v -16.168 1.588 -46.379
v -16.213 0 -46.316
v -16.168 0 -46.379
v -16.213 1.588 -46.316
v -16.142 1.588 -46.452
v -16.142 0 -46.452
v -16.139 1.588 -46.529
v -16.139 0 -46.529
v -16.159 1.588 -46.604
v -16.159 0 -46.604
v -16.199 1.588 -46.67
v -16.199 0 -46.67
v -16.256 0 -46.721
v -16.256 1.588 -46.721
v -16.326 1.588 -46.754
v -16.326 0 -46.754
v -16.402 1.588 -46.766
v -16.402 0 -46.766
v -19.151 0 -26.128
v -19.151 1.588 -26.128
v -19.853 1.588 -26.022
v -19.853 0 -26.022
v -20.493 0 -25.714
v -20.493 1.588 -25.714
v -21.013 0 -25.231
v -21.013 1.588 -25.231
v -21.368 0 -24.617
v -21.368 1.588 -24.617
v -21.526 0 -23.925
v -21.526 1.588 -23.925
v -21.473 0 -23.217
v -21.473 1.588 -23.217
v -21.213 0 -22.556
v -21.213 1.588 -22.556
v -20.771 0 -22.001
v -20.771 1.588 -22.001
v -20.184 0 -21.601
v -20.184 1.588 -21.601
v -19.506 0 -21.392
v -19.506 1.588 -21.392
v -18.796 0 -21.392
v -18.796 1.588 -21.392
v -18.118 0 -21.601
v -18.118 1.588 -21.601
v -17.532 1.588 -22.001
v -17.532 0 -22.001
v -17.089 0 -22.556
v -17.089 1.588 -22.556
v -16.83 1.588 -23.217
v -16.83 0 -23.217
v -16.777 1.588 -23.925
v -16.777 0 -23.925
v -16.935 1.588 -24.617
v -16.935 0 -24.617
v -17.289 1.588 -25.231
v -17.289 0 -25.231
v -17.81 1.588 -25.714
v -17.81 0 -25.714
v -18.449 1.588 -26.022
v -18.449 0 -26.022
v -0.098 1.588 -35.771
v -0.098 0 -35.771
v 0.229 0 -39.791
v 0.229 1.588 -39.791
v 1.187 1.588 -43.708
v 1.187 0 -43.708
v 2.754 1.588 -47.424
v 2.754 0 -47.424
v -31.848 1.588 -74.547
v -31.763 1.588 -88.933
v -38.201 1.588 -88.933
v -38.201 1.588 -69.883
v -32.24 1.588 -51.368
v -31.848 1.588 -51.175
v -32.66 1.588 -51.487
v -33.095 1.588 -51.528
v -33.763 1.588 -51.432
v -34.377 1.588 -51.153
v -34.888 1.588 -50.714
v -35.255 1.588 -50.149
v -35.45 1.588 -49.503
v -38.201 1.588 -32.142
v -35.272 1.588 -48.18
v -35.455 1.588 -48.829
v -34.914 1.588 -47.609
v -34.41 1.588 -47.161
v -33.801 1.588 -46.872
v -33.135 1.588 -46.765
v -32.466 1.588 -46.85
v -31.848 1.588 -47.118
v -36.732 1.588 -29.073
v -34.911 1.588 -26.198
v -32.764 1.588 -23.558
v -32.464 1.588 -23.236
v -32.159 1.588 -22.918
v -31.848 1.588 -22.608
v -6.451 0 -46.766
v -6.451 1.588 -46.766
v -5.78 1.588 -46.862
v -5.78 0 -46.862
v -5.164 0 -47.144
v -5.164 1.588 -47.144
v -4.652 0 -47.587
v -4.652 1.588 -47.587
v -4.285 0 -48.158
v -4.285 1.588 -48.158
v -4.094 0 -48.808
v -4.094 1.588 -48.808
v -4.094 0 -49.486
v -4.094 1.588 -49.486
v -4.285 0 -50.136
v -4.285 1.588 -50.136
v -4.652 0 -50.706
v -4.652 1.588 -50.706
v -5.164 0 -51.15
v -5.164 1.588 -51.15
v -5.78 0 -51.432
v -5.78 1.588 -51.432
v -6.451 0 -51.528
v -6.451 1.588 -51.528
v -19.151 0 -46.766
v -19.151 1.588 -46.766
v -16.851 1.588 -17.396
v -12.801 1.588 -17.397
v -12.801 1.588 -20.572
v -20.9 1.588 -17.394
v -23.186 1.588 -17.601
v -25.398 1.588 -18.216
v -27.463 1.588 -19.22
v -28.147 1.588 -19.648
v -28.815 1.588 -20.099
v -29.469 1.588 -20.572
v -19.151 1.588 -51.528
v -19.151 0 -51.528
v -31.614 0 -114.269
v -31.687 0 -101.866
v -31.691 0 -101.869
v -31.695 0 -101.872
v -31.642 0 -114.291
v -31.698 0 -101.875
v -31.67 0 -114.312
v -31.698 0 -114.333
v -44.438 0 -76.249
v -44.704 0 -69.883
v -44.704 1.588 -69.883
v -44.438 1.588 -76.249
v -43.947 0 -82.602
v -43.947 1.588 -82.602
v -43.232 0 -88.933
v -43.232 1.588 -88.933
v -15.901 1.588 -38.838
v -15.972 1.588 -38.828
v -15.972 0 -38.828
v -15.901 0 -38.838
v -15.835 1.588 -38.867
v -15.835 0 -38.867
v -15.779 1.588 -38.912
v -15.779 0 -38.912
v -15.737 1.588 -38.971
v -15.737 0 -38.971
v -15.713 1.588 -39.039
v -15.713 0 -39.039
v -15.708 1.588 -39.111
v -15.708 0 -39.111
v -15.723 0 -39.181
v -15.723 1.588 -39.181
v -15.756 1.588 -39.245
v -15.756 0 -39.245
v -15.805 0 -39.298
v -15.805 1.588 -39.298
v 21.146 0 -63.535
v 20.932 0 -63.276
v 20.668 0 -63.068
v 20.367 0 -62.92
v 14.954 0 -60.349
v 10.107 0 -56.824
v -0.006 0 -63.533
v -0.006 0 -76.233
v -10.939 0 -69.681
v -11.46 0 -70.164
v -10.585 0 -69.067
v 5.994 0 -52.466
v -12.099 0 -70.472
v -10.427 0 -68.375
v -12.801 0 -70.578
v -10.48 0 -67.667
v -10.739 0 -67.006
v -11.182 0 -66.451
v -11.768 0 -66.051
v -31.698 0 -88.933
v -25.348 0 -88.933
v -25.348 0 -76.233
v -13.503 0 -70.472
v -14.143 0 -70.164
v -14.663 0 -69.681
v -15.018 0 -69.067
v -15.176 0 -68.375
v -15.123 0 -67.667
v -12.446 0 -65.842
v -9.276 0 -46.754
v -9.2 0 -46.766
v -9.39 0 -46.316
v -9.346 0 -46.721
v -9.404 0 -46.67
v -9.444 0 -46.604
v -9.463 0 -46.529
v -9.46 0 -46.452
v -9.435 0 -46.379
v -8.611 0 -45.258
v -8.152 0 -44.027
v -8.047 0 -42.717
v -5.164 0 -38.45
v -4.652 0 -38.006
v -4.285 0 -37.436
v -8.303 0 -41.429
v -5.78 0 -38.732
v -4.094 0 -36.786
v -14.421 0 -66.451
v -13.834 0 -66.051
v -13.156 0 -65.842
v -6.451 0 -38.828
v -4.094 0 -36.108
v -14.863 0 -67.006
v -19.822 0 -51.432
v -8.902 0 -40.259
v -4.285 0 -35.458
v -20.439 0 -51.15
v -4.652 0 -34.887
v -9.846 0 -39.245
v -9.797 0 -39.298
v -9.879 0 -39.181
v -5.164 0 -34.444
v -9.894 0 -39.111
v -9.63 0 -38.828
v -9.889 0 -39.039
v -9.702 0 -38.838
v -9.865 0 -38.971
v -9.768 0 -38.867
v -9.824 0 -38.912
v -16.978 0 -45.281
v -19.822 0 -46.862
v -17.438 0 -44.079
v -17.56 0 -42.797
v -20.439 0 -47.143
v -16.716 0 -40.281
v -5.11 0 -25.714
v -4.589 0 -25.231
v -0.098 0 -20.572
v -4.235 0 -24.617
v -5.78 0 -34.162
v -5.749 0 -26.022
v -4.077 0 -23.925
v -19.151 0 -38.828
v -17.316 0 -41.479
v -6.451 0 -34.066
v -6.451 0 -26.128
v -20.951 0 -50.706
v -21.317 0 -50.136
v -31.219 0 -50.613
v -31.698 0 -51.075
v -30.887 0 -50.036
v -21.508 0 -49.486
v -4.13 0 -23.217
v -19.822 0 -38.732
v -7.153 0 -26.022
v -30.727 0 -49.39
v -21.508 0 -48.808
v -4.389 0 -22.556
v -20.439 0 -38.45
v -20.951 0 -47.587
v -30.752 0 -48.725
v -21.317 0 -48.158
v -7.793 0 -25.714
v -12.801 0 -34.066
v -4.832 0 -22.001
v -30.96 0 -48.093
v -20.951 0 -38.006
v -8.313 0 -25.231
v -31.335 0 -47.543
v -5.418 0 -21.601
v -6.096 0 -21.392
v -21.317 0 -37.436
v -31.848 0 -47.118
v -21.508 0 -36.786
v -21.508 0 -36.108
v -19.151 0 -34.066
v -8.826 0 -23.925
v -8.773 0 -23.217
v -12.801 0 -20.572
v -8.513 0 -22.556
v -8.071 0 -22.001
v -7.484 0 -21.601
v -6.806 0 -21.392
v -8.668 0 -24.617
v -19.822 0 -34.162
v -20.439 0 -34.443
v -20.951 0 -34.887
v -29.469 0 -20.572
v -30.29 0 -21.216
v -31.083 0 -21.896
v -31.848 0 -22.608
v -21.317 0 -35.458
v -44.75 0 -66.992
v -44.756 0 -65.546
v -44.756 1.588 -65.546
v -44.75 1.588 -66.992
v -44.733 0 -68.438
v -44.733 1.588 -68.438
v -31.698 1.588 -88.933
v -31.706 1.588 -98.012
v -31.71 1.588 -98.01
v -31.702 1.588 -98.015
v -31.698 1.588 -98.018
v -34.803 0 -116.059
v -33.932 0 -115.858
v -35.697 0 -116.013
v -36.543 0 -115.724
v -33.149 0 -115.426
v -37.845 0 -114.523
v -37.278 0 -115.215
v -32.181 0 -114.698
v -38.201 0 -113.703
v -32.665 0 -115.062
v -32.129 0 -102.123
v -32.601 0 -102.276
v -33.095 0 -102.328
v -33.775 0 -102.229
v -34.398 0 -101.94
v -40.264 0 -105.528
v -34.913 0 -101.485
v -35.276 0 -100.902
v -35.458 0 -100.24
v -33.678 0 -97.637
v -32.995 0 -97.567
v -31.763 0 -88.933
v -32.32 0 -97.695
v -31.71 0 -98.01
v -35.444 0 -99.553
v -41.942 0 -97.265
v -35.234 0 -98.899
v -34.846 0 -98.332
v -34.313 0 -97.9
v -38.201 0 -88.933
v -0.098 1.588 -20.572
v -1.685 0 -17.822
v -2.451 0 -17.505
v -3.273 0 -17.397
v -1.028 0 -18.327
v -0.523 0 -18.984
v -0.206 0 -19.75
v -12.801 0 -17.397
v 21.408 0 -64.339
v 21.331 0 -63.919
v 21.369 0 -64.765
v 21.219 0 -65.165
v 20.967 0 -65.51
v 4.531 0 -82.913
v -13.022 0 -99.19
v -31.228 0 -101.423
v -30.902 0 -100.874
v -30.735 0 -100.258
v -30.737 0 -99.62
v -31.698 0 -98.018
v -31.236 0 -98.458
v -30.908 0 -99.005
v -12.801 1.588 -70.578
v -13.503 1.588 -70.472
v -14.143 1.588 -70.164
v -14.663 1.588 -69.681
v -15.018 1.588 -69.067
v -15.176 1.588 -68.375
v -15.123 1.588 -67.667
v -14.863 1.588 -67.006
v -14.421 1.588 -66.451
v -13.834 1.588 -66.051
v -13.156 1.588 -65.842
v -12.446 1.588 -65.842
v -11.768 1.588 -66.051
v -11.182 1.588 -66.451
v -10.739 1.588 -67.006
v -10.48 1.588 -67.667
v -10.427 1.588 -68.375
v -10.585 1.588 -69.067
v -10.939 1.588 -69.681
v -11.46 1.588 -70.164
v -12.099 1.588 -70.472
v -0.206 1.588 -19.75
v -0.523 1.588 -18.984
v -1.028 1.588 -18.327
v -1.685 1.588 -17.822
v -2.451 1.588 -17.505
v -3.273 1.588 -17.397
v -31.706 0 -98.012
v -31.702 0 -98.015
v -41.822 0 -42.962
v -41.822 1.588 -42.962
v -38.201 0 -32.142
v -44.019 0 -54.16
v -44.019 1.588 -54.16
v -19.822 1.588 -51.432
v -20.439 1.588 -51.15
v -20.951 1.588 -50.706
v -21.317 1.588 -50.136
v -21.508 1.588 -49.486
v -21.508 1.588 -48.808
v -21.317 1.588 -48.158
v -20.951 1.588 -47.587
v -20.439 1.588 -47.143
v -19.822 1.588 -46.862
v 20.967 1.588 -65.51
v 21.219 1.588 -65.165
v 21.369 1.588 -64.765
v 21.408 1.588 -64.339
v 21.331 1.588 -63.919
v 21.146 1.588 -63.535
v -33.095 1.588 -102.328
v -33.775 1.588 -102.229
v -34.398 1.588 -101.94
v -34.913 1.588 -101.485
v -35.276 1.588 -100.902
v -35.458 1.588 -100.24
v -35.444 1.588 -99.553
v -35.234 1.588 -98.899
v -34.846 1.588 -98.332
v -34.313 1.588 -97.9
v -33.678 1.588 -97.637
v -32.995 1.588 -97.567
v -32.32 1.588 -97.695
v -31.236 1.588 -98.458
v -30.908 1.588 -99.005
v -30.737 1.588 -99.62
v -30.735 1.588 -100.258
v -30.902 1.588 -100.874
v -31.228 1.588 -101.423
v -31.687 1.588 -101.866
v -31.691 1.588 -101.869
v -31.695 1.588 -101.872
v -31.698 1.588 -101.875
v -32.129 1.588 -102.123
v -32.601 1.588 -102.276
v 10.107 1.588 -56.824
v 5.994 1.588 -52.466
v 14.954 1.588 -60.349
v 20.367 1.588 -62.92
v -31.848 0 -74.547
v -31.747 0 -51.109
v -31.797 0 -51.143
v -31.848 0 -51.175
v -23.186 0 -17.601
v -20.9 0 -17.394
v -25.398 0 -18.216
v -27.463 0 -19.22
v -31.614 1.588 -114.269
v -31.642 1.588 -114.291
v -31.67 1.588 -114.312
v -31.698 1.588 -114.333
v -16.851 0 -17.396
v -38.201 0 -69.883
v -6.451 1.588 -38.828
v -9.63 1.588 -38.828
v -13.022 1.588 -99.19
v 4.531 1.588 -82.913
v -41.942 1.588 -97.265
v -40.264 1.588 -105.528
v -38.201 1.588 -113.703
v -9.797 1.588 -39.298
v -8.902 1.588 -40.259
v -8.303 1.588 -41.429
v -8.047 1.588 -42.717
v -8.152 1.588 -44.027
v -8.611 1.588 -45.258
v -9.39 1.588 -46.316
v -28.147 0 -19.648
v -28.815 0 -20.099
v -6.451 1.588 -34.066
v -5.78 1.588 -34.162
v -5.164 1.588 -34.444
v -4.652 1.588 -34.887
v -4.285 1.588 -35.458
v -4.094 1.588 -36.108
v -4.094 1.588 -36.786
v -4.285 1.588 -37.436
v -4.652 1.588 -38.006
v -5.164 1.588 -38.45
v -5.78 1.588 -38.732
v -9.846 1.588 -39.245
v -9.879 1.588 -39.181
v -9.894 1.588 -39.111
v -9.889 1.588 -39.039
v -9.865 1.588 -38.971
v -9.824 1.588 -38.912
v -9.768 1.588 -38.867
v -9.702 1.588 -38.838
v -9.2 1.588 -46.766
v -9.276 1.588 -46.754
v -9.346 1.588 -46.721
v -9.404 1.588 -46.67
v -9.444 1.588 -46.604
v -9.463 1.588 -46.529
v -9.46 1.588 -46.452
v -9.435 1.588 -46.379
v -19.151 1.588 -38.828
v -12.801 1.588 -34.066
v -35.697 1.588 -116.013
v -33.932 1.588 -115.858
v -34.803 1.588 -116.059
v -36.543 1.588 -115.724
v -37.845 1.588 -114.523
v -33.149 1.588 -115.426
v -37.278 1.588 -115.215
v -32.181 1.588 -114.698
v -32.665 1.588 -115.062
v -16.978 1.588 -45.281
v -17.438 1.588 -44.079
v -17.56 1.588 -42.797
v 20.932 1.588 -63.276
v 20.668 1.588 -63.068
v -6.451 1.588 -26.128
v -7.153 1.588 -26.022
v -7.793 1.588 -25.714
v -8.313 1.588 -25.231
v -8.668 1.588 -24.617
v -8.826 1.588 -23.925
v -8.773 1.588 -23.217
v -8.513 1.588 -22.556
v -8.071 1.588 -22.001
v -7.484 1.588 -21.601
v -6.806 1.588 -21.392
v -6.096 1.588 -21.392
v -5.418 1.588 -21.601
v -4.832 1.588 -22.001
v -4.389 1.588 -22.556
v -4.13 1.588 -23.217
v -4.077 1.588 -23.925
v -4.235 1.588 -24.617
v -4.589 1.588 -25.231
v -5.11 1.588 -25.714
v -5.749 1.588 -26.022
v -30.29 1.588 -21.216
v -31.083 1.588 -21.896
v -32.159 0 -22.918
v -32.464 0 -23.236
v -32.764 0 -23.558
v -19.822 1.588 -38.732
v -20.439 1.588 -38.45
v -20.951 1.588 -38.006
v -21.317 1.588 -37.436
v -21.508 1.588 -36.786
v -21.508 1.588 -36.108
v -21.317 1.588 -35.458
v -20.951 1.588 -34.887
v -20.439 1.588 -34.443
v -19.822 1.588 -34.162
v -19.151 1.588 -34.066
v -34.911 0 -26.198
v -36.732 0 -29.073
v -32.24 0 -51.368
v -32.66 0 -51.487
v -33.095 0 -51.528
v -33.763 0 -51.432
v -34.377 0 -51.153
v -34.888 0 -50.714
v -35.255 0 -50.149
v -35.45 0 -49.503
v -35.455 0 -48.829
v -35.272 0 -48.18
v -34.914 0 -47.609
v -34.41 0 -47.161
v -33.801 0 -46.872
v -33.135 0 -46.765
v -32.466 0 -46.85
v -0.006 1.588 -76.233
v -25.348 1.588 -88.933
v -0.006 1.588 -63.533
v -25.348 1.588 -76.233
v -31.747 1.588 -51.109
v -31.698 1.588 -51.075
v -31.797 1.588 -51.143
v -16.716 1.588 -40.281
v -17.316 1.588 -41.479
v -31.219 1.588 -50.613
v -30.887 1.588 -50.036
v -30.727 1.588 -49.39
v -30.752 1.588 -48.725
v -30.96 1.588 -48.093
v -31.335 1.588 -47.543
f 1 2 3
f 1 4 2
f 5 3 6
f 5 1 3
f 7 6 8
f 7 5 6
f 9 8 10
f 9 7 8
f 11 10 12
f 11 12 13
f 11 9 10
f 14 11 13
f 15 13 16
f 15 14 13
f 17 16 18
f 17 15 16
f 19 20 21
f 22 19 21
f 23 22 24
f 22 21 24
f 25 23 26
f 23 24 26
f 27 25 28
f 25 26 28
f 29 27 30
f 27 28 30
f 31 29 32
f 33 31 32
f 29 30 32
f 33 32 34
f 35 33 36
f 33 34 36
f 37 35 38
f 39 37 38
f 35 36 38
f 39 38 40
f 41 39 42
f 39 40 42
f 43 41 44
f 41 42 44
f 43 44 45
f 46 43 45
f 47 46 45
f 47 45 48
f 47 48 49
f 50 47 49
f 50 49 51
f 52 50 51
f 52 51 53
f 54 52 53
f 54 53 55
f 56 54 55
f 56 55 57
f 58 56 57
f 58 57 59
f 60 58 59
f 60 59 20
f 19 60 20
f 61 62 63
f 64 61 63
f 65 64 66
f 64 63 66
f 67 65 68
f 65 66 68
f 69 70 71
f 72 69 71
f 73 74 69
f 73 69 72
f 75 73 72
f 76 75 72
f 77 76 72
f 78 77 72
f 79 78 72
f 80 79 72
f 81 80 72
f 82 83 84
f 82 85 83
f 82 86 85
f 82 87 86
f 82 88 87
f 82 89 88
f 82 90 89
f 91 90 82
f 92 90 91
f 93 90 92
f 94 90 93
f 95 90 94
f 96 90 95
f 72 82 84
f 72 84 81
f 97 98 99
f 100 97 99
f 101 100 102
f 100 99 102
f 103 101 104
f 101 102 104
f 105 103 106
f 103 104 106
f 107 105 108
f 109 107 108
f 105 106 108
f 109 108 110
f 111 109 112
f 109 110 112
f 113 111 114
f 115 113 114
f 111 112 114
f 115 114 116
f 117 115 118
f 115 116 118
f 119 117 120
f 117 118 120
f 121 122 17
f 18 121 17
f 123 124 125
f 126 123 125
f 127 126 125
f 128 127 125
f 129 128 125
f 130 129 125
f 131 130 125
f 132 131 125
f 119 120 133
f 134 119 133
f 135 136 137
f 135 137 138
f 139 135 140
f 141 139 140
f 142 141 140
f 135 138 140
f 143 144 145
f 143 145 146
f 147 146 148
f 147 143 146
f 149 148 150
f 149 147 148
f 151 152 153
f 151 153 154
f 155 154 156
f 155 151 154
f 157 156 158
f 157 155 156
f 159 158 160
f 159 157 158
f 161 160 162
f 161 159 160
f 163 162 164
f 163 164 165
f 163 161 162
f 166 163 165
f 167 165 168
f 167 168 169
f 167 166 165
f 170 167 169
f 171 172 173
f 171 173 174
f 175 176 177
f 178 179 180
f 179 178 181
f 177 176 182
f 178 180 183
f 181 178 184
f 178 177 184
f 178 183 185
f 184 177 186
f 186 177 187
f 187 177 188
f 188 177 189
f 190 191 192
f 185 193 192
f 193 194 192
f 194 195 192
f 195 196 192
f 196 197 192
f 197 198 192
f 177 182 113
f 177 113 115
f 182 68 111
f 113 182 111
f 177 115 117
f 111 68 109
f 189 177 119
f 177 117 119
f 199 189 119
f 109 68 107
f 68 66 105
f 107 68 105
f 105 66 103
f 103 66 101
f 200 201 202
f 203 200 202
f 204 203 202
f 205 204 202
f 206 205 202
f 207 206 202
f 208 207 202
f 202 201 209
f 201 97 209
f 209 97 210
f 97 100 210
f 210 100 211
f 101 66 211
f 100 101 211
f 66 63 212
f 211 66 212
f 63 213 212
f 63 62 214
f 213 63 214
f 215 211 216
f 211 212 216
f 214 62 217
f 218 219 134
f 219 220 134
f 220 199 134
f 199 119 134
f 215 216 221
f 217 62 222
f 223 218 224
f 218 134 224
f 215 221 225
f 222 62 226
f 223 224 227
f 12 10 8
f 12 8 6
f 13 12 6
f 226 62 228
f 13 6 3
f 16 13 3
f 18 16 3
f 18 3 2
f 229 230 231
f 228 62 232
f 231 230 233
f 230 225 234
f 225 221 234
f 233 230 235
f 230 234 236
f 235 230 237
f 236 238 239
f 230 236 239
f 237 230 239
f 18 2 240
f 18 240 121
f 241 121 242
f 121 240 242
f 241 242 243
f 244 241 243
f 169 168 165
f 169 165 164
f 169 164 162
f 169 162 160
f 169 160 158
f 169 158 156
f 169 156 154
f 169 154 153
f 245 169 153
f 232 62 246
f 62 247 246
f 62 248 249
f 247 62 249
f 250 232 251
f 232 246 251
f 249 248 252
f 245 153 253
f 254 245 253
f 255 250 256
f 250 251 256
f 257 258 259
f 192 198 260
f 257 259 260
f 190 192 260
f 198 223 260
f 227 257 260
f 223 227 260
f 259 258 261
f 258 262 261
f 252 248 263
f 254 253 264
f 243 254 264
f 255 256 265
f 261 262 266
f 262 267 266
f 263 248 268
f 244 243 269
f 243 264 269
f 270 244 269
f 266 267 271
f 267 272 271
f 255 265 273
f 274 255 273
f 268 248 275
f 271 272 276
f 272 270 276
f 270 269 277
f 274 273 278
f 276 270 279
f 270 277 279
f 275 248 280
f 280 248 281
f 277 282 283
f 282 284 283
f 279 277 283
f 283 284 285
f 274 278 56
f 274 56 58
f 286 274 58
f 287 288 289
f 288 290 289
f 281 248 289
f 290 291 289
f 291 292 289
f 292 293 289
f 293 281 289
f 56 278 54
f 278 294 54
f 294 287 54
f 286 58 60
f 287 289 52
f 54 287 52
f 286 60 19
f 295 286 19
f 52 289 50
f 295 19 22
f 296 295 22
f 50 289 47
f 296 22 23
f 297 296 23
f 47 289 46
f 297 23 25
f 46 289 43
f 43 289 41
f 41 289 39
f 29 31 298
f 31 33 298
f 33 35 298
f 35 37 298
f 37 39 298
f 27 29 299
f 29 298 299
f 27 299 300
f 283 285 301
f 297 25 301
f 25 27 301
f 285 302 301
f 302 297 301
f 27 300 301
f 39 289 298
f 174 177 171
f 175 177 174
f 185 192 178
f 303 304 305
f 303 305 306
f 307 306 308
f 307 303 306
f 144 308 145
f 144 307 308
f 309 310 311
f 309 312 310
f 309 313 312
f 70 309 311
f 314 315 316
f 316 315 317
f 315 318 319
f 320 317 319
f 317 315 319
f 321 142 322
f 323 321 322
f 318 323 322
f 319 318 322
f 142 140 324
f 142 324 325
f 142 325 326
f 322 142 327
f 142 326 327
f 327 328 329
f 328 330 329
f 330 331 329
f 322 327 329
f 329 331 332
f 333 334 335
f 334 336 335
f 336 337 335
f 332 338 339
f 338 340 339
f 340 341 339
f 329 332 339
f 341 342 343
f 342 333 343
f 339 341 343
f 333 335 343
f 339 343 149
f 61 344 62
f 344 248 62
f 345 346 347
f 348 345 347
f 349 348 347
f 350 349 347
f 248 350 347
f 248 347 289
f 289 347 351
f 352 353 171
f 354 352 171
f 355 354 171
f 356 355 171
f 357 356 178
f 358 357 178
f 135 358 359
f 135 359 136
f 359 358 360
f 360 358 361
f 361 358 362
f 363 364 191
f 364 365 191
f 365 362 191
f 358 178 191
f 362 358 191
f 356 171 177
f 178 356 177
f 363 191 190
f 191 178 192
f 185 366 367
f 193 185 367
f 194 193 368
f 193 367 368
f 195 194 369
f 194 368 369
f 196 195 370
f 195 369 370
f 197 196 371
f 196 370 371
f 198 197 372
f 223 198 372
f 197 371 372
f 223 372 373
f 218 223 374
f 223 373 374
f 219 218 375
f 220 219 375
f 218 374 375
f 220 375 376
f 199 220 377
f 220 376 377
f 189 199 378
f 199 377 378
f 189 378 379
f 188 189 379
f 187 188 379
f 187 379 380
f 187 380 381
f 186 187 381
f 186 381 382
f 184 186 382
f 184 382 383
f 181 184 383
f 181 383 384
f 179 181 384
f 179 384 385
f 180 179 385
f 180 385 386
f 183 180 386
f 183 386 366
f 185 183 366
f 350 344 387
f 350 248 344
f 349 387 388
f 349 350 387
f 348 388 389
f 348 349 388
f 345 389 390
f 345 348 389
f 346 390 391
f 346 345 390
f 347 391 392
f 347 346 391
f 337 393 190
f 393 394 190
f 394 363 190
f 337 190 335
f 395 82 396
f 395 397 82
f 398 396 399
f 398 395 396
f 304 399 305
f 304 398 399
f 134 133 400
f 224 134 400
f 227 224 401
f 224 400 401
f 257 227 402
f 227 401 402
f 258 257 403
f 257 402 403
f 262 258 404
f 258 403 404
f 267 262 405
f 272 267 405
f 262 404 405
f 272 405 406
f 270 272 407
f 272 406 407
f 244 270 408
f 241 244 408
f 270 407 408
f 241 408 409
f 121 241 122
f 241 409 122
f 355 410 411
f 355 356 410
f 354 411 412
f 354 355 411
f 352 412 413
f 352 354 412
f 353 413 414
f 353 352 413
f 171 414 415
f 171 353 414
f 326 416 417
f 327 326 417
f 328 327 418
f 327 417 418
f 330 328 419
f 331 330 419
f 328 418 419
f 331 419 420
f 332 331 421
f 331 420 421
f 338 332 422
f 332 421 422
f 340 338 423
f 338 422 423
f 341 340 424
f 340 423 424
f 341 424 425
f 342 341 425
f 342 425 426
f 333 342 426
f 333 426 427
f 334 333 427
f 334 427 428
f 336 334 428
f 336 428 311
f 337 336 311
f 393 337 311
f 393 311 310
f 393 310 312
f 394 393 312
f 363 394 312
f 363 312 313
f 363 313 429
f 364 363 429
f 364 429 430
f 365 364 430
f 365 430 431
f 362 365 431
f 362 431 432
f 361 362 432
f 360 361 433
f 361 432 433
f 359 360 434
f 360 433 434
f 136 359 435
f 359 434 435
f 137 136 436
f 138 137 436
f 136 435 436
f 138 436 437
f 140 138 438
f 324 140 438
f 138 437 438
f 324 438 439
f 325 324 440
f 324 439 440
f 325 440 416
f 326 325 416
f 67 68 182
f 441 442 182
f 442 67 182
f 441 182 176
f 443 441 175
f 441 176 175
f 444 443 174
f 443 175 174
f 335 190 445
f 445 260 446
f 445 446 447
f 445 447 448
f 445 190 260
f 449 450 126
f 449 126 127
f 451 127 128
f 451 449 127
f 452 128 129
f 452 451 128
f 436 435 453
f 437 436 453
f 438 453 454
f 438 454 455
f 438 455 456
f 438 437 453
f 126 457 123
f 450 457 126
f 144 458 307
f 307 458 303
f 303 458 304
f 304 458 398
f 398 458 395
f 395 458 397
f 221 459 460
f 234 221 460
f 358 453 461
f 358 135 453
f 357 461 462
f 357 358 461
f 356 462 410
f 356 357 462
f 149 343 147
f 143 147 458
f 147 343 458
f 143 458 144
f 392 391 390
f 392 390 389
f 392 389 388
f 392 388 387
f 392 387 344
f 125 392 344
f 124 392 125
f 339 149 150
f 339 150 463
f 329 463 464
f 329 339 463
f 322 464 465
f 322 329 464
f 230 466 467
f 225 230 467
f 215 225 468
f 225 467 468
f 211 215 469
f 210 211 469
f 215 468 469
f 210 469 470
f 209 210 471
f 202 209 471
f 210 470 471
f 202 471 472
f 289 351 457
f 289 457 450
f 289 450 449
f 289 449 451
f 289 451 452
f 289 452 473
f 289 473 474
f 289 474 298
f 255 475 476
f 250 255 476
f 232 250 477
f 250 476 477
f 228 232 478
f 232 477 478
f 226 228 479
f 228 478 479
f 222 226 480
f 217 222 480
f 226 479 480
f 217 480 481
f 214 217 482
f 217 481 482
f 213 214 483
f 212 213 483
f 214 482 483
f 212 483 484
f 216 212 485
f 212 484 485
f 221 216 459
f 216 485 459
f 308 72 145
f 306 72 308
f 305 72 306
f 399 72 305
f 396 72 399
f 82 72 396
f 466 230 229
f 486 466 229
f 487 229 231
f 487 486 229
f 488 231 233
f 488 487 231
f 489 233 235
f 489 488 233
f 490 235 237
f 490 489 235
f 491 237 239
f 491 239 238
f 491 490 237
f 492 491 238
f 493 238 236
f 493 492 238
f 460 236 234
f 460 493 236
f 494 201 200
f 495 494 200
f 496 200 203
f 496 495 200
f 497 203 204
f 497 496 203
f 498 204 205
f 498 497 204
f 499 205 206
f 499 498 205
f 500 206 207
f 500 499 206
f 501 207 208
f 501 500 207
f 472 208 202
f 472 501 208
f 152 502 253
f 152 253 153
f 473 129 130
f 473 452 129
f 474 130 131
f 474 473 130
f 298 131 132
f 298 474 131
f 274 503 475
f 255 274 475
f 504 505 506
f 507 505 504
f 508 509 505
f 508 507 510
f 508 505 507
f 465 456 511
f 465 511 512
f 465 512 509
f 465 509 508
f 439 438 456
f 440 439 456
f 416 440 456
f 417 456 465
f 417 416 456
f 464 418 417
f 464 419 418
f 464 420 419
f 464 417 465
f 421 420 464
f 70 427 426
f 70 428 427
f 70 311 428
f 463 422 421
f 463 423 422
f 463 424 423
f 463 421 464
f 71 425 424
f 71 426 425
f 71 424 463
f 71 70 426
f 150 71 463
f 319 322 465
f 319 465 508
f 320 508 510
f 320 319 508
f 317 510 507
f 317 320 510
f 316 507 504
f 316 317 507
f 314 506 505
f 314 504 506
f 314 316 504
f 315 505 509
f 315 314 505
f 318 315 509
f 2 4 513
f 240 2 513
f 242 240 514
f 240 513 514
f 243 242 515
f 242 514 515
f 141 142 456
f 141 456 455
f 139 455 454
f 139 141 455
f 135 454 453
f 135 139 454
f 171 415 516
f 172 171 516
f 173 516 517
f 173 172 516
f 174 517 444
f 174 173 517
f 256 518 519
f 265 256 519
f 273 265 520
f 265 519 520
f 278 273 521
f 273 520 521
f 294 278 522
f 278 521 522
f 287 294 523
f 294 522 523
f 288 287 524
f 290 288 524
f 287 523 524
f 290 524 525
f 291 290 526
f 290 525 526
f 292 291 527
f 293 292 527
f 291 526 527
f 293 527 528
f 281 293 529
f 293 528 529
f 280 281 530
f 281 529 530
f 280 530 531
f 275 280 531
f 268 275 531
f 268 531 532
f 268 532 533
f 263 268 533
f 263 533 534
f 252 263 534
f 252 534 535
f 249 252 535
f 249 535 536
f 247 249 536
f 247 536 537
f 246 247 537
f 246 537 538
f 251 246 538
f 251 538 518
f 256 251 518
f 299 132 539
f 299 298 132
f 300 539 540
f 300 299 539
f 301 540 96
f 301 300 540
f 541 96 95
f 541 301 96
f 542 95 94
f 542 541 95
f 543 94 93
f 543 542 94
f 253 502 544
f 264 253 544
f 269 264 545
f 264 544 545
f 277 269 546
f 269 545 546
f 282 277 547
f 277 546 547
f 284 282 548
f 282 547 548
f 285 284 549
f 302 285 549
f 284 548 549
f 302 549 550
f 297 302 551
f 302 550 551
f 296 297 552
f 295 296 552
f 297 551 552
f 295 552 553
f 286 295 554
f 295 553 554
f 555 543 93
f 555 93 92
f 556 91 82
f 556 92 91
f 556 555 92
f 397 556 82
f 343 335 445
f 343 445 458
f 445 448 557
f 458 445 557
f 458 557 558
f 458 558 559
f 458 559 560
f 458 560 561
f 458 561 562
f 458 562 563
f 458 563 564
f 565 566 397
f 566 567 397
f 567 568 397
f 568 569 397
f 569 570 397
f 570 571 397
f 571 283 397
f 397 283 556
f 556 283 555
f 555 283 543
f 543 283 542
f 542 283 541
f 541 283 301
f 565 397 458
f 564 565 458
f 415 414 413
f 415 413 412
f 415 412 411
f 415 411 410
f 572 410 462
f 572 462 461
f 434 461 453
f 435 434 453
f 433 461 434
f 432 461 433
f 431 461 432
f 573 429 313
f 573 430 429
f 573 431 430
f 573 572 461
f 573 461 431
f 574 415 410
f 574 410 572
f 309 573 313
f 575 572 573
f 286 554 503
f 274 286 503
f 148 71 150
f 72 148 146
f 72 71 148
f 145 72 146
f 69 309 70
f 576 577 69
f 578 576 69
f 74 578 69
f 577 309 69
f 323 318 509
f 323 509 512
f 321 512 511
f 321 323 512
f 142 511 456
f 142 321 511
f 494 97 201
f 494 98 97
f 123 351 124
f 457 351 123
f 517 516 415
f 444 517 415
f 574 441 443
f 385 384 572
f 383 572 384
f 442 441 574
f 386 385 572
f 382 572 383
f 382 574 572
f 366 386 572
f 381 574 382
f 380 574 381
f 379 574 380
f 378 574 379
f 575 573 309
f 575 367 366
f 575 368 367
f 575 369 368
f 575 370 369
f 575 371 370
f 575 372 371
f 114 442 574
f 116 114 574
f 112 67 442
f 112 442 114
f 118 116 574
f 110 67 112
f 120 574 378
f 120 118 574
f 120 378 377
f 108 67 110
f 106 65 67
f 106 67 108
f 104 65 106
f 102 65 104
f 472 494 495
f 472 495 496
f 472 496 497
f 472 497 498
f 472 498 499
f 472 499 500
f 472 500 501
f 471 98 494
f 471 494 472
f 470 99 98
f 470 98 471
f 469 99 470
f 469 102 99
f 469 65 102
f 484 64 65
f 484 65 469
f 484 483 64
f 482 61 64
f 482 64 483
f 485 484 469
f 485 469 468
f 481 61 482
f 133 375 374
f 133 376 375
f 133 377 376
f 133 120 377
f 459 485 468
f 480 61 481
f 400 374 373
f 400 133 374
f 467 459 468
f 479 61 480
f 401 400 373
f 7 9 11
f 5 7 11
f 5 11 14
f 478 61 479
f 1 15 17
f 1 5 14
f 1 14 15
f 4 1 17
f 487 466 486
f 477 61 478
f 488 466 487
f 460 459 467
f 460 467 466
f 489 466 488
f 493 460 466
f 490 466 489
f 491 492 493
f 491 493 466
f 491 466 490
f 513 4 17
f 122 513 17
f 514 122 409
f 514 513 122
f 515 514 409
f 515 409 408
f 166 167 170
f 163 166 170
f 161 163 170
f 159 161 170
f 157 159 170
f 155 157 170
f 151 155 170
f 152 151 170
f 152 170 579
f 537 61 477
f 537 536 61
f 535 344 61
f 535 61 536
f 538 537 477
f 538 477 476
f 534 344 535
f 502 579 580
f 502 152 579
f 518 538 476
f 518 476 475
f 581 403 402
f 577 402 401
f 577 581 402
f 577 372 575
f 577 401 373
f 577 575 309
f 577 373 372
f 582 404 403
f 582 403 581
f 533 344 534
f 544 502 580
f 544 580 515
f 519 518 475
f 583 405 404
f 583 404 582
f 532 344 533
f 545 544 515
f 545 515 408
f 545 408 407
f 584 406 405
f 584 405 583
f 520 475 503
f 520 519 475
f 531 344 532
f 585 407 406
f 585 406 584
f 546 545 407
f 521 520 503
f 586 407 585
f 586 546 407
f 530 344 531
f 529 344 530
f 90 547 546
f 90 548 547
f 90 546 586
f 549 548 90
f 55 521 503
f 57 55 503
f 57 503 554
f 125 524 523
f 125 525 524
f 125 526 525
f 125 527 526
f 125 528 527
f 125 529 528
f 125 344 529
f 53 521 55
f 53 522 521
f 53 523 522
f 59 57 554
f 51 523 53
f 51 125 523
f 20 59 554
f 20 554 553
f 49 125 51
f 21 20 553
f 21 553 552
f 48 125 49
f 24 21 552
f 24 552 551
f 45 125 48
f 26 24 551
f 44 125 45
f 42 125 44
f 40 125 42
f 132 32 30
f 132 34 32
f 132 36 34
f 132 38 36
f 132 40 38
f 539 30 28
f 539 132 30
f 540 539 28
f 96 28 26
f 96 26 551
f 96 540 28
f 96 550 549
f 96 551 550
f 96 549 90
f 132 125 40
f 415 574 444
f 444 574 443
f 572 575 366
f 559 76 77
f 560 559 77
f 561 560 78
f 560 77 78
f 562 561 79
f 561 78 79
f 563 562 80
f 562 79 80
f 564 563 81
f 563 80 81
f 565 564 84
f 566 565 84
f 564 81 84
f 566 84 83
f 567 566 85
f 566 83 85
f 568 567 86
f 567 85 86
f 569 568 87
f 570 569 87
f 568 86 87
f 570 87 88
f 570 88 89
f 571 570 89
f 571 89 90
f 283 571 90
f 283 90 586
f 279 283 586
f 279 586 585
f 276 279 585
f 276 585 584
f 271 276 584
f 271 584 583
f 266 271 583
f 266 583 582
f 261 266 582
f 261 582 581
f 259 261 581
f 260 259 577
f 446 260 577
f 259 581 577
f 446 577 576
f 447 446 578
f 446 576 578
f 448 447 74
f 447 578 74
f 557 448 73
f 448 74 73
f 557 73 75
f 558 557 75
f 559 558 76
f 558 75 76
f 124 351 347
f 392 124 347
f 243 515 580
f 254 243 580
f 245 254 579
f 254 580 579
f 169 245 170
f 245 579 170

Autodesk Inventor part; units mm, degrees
ref_plane "YZ Plane" through (0, 0, 0) normal (1, 0, 0) x (0, 1, 0)
ref_plane "XZ Plane" through (0, 0, 0) normal (0, 1, 0) x (-1, 0, 0)
ref_plane "XY Plane" through (0, 0, 0) normal (0, 0, 1) x (1, 0, 0)
sketch "Sketch2" plane through (0, 0, 0) normal (0, 1, 0) x (-1, 0, 0)
  line L0 (50.8978, -88.9331) -> (25.3484, -88.9331)
  line L1 (25.3484, -88.9331) -> (25.3484, -76.2331)
  line L2 (25.3484, -76.2331) -> (0.0063, -76.2331)
  line L3 (50.8978, -88.9331) -> (50.8978, -113.4067)
  line L4 (0.0063, -76.2331) -> (0.0055, -63.5331)
  line L5 (0.0055, -63.5331) -> (-22.2195, -63.5346)
  arc A0 (-20.3669, -62.9196) -> (-2.754, -47.4243) centre (-31.4849, -32.5245) ccw
  arc A1 (48.1058, -116.5585) -> (50.8978, -113.4067) centre (47.7228, -113.4067) ccw
  arc A2 (-20.3669, -62.9196) -> (-20.967, -65.5097) centre (-19.8216, -64.4105) ccw
  arc A3 (-2.754, -47.4243) -> (0.0978, -35.7707) centre (-25.3022, -35.7309) ccw
  line L6 (0.0978, -4.698) -> (47.7219, -4.6852)
  line L7 (50.8978, -7.8602) -> (50.8978, -88.9331)
  line L8 (0.0978, -20.5717) -> (0.0978, -35.7707)
  line L9 (3.2719, -4.6971) -> (12.7978, -4.6946)
  line L10 (12.7978, -4.6946) -> (12.8012, -17.3967)
  line L11 (12.8012, -17.3967) -> (20.9, -17.3945)
  line L12 (38.2012, -17.3899) -> (38.2012, -93.5899)
  line L13 (12.8012, -17.3967) -> (12.8012, -68.1967)
  arc A4 (50.8978, -7.8602) -> (47.7219, -4.6852) centre (47.7228, -7.8602) ccw
  arc A5 (3.2719, -4.6971) -> (0.0978, -7.8721) centre (3.2728, -7.8721) ccw
  line L14 (12.8012, -68.1967) -> (12.8012, -74.5467)
  line L15 (38.2012, -93.5899) -> (38.2012, -99.9399)
  line L16 (38.2012, -17.3899) -> (38.2012, -23.7399)
  line L17 (12.8012, -17.3967) -> (12.8012, -23.7467)
  line L18 (12.8012, -23.7467) -> (19.1512, -23.7467)
  line L19 (19.1512, -23.7467) -> (6.4512, -23.7467)
  line L20 (25.3484, -88.9331) -> (31.6984, -88.9331)
  line L21 (31.6984, -88.9331) -> (31.6984, -114.3331)
  arc A6 (-20.967, -65.5097) -> (31.6984, -114.3331) centre (249.7999, 173.7477) ccw
  arc A7 (31.6984, -114.3331) -> (33.1489, -115.4256) centre (249.7999, 173.7477) ccw
  line L22 (38.2012, -88.9331) -> (38.2012, -69.8831)
  line L23 (38.2012, -69.8831) -> (44.7036, -69.8831)
  line L24 (38.2012, -17.3899) -> (16.8506, -17.3956)
  line L25 (12.8012, -17.3967) -> (3.2728, -17.3967)
  arc A8 (38.2012, -113.7028) -> (38.2012, -17.3899) centre (-135.4238, -65.5464) ccw
  arc A9 (33.1489, -115.4256) -> (38.2012, -113.7028) centre (35.0868, -112.839) ccw
  arc A10 (3.2728, -17.3967) -> (0.0978, -20.5717) centre (3.2728, -20.5717) ccw
  line L26 (38.2012, -17.3899) -> (16.8506, -17.3956)
  arc A11 (44.7558, -65.5464) -> (30.4886, -17.392) centre (-43.6427, -65.5464) ccw
  arc A12 (38.2012, -32.1417) -> (24.6857, -17.3935) centre (11.5084, -43.0364) ccw
  arc A13 (32.7636, -23.5578) -> (27.4631, -19.2197) centre (15.0605, -39.7812) ccw
  arc A14 (27.4631, -19.2197) -> (20.9, -17.3945) centre (20.9035, -30.0945) ccw
  line L27 (0.0978, -20.5717) -> (31.8478, -20.5717)
  line L28 (31.8478, -20.5717) -> (31.8478, -76.2331)
  line L29 (31.8478, -17.3916) -> (31.8478, -74.5467)
  line L30 (31.8478, -74.5467) -> (31.6984, -99.9463)
  line L31 (31.6984, -99.9463) -> (31.5861, -119.0417)
  line L32 (31.6984, -99.9463) -> (31.6984, -49.1463)
  line L33 (31.6984, -99.9463) -> (82.4984, -99.9463) construction
  line L34 (31.6984, -49.1463) -> (33.0954, -49.1463)
  line L35 (31.6984, -99.9463) -> (33.0954, -99.9463)
  point P0 (0, 0)
  point P1 (50.8978, -120.6831)
  point P2 (0.0775, -39.6857)
  point P3 (-21.1455, -63.5345)
  point P4 (50.8978, -4.6844)
  point P5 (3.2719, -4.6971)
  point P6 (38.0838, -119.0579)
  point P7 (23.7439, -17.3938)
  point P8 (12.8012, -17.3967)
  dimension "d3" = 12.7
  dimension "d4" = 31.75
  dimension "d5" = 12.7
  dimension "d6" = 22.225
  dimension "d18" = 3.175
  dimension "d19" = 1.5875
  dimension "d23" = 4.699
  dimension "d24" = 12.7
  dimension "d25" = 25.4
  dimension "d26" = 76.2
  dimension "d27" = 50.8
  dimension "d28" = 3.175
  dimension "d33" = 6.35
  dimension "d35" = 6.35
  dimension "d36" = 6.35
  dimension "d37" = 6.35
  dimension "d38" = 12.7
  dimension "d54" = 6.35
  dimension "d55" = 25.4
  dimension "d56" = 50.8
  dimension "d58" = 19.05
  dimension "d59" = 3.175
  dimension "d60" = 12.7
  dimension "d61" = 31.75
  dimension "d62" = 25.4
  dimension "d63" = 19.0957
  dimension "d64" = 180
  dimension "d65" = 50.8
  dimension "d66" = 90
  dimension "d69" = 1.397
extrude "Extrusion1" add sketch "Sketch2" along normal blind 1.5875 contours L21 L31 A6 A2 L5 L4 L2 L1 L0 | L32 L34 L28 L30 L0 | L0 L30 L21 | L0 L1 L2 L4 L5 A2 A0 A3 L8 L27 A13 L28 L34 L32 | L30 L28 A12 L12 L0 | L0 A8 A9 A7 L21 L30 | L21 A6 L31 | L12 L23 A8 L0 | L12 A11 A8 L23 | L27 L13 L11 A14 A13 | L27 A10 L25 L13
hole "Hole3" at (-6.4512, 0, -23.7467) at (-19.1512, 0, -23.7467) at (-12.8012, 0, -68.1967) at (-33.0954, 0, -49.1463) at (-33.0954, 0, -99.9463) direction (0, 1, 0) diameter 4.7625 end through all
sketch "Sketch3" plane through (0, 1.5875, 0) normal (0, 1, 0) x (1, 0, 0)
  circle A0 centre (-19.1512, 23.7467) radius 2.3813 projected
  line L0 (-19.1512, 23.7467) -> (-19.1512, 42.7967) construction
  line L1 (-19.1512, 23.7467) -> (-0.1012, 23.7467) construction
  line L2 (-19.1512, 42.7967) -> (-12.8012, 42.7967)
  circle A1 centre (-6.4512, 23.7467) radius 2.3813 projected
  line L3 (-6.4512, 23.7467) -> (-6.4512, 36.4467) construction
  line L4 (-6.4512, 36.4467) -> (-19.1512, 36.4467) construction
  arc A2 (-19.1512, 38.828) -> (-19.1512, 34.0655) centre (-19.1512, 36.4467) ccw
  arc A3 (-6.4512, 34.0655) -> (-6.4512, 38.828) centre (-6.4512, 36.4467) ccw
  line L5 (-19.1512, 34.0655) -> (-6.4512, 34.0655)
  line L6 (-6.4512, 36.4467) -> (-6.4512, 49.1467) construction
  line L7 (-6.4512, 49.1467) -> (-19.1512, 49.1467) construction
  arc A4 (-19.1512, 51.528) -> (-19.1512, 46.7655) centre (-19.1512, 49.1467) ccw
  arc A5 (-6.4512, 46.7655) -> (-6.4512, 51.528) centre (-6.4512, 49.1467) ccw
  line L8 (-6.4512, 51.528) -> (-19.1512, 51.528)
  line L9 (-12.8012, 34.0655) -> (-12.8012, 36.4467)
  line L10 (-12.8012, 36.4467) -> (-19.1512, 36.4467)
  line L11 (-19.1512, 38.828) -> (-15.9722, 38.828)
  line L12 (-6.4512, 38.828) -> (-9.6302, 38.828)
  line L13 (-6.4512, 46.7655) -> (-9.1999, 46.7655)
  line L14 (-19.1512, 46.7655) -> (-16.4024, 46.7655)
  arc A6 (-9.7971, 39.2979) -> (-9.3895, 46.3163) centre (-12.8012, 42.9934) ccw
  arc A7 (-16.2129, 46.3163) -> (-15.8053, 39.2979) centre (-12.8012, 42.9934) ccw
  arc A8 (-9.7971, 39.2979) -> (-9.6302, 38.828) centre (-9.6302, 39.0926) ccw
  arc A9 (-15.9722, 38.828) -> (-15.8053, 39.2979) centre (-15.9722, 39.0926) ccw
  arc A10 (-16.2129, 46.3163) -> (-16.4024, 46.7655) centre (-16.4024, 46.5009) ccw
  arc A11 (-9.1999, 46.7655) -> (-9.3895, 46.3163) centre (-9.1999, 46.5009) ccw
  point P0 (0, 0)
  point P1 (-15.1101, 38.828)
  point P2 (-10.4923, 38.828)
  point P3 (-9.8938, 46.7655)
  point P4 (-15.7085, 46.7655)
  dimension "d70" = 19.05
  dimension "d71" = 90
  dimension "d72" = 6.35
  dimension "d73" = 12.7
  dimension "d78" = 6.35
  dimension "d79" = 0.2646
extrude "Extrusion2" cut sketch "Sketch3" against normal through all contours L11 A9 A7 A10 L14 A4 L8 A5 L13 A11 A6 A8 L12 A3 L5 A2
properties part number "sled2" material "Polycarbonate, Smoke"
